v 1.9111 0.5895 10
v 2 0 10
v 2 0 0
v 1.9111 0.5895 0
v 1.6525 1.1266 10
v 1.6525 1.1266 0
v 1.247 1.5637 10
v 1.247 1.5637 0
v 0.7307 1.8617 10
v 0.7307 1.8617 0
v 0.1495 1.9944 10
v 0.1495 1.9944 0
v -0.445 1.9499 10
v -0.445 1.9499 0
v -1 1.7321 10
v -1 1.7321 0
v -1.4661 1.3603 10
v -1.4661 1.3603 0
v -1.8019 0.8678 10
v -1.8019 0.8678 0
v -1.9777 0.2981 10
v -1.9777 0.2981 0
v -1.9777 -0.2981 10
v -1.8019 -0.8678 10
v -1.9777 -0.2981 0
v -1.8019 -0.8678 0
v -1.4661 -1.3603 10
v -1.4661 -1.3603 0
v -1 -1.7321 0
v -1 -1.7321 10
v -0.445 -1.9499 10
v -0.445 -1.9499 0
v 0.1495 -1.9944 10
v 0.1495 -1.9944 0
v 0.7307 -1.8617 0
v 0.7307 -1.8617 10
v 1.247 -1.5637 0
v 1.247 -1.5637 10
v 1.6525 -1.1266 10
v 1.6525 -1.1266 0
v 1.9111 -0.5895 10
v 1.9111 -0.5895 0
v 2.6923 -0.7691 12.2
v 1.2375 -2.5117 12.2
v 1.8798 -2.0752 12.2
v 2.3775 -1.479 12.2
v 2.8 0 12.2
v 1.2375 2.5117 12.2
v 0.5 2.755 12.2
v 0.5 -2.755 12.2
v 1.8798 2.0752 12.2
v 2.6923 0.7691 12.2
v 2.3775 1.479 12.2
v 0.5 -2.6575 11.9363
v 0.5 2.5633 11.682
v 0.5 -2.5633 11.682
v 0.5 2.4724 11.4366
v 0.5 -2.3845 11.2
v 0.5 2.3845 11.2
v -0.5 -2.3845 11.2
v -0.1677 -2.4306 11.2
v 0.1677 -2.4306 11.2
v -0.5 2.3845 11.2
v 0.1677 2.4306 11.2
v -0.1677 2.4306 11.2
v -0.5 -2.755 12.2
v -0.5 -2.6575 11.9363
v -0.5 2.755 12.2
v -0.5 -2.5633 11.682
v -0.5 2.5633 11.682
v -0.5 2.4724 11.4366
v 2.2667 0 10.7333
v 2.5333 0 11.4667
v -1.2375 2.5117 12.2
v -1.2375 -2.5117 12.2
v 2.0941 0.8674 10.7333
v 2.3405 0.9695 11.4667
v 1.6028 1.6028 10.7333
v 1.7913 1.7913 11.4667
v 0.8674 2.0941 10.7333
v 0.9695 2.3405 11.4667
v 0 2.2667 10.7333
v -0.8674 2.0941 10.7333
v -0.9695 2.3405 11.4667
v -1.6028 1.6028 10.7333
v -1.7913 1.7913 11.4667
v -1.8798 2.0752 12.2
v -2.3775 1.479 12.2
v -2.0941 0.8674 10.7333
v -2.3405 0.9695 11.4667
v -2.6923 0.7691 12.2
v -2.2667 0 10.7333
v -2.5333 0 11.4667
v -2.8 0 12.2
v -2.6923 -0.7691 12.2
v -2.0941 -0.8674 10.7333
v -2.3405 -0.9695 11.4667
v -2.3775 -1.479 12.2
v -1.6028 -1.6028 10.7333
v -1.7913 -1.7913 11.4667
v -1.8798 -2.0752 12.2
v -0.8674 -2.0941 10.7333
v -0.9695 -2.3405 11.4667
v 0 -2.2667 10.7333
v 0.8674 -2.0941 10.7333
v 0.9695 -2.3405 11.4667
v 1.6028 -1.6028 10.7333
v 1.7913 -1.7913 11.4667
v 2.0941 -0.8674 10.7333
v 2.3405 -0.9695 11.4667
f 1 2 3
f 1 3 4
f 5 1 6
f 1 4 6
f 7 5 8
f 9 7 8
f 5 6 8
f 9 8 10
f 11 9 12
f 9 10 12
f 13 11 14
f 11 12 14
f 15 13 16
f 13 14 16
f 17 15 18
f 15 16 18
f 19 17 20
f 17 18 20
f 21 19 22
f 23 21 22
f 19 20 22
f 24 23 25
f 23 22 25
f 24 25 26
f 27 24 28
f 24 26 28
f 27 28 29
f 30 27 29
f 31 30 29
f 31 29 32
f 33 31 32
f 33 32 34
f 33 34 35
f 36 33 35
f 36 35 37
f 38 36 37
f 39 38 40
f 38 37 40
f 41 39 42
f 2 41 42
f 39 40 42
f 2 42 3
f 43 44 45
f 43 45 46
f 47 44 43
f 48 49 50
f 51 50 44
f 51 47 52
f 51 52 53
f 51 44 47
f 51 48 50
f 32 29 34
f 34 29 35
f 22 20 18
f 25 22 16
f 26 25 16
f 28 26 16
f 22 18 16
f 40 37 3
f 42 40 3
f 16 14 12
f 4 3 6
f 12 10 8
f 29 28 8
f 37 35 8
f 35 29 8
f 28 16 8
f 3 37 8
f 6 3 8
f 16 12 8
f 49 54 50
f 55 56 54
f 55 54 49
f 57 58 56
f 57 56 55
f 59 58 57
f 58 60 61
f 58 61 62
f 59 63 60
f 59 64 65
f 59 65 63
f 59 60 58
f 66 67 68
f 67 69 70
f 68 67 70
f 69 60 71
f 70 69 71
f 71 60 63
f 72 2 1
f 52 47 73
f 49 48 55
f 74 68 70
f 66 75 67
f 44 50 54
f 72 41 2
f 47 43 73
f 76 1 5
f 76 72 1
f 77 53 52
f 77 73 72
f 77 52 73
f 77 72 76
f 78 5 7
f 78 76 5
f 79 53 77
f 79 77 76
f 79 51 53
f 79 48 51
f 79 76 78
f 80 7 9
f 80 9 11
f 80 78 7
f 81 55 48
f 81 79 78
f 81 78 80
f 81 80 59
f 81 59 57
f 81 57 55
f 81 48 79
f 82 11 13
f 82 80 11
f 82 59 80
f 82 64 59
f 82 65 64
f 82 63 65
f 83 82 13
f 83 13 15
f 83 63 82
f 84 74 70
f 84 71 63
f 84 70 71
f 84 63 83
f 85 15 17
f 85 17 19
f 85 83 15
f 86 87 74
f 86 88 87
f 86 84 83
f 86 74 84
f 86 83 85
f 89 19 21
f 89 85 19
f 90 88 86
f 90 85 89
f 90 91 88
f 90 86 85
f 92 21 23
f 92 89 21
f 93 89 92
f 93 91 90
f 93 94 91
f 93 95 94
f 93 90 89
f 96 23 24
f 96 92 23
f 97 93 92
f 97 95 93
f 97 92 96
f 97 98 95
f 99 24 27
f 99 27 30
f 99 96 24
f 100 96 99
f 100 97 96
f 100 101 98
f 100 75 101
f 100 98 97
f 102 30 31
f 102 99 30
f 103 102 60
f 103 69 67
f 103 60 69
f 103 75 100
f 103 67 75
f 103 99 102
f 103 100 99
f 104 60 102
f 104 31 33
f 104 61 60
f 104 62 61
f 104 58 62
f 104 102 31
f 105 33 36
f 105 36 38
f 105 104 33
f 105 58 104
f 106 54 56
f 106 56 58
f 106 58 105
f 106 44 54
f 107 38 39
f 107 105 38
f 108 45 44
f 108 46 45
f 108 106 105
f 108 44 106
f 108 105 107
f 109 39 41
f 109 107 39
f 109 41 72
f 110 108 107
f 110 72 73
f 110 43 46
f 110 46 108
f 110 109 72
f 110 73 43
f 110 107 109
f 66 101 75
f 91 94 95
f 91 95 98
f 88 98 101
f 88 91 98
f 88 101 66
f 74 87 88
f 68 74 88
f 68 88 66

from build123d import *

# Parameters (mm, degrees)
CYLINDER_R     = 2
CYLINDER_DEPTH = 10
BOX_W          = 1
BOX_H          = 10
BOX_DEPTH      = 10


with BuildPart() as cilindre:
    # Cylinder → Cylinder (new body)
    with BuildSketch(Plane.XY):
        Circle(CYLINDER_R)
    extrude(amount=CYLINDER_DEPTH)


with BuildPart() as cub:
    # Box → Box (new body)
    with BuildSketch(Plane(origin=(-0.5, -4, 1.2), x_dir=(1, 0, 0), z_dir=(0, 0, 1))):
        with Locations((0.5, 5)):
            Rectangle(BOX_W, BOX_H)
    extrude(amount=BOX_DEPTH)


with BuildPart() as fusion:
    # Cone → Cone (revolve)
    with BuildSketch(Plane.XZ):
        Polygon((0, 0), (2, 0), (2.8, 2.2), (0, 2.2), align=None)
    revolve(axis=Axis((0, 0, 0), (0, 0, 1)))

    # Cut: cut Cub
    add(cub.part, mode=Mode.SUBTRACT)


with BuildPart() as fusion_1:
    # Cut placement: moved
    add(fusion.part.moved(Location((0, 0, 10))))

    # Fusion: union Cilindre
    add(cilindre.part)


solid = fusion_1.part
